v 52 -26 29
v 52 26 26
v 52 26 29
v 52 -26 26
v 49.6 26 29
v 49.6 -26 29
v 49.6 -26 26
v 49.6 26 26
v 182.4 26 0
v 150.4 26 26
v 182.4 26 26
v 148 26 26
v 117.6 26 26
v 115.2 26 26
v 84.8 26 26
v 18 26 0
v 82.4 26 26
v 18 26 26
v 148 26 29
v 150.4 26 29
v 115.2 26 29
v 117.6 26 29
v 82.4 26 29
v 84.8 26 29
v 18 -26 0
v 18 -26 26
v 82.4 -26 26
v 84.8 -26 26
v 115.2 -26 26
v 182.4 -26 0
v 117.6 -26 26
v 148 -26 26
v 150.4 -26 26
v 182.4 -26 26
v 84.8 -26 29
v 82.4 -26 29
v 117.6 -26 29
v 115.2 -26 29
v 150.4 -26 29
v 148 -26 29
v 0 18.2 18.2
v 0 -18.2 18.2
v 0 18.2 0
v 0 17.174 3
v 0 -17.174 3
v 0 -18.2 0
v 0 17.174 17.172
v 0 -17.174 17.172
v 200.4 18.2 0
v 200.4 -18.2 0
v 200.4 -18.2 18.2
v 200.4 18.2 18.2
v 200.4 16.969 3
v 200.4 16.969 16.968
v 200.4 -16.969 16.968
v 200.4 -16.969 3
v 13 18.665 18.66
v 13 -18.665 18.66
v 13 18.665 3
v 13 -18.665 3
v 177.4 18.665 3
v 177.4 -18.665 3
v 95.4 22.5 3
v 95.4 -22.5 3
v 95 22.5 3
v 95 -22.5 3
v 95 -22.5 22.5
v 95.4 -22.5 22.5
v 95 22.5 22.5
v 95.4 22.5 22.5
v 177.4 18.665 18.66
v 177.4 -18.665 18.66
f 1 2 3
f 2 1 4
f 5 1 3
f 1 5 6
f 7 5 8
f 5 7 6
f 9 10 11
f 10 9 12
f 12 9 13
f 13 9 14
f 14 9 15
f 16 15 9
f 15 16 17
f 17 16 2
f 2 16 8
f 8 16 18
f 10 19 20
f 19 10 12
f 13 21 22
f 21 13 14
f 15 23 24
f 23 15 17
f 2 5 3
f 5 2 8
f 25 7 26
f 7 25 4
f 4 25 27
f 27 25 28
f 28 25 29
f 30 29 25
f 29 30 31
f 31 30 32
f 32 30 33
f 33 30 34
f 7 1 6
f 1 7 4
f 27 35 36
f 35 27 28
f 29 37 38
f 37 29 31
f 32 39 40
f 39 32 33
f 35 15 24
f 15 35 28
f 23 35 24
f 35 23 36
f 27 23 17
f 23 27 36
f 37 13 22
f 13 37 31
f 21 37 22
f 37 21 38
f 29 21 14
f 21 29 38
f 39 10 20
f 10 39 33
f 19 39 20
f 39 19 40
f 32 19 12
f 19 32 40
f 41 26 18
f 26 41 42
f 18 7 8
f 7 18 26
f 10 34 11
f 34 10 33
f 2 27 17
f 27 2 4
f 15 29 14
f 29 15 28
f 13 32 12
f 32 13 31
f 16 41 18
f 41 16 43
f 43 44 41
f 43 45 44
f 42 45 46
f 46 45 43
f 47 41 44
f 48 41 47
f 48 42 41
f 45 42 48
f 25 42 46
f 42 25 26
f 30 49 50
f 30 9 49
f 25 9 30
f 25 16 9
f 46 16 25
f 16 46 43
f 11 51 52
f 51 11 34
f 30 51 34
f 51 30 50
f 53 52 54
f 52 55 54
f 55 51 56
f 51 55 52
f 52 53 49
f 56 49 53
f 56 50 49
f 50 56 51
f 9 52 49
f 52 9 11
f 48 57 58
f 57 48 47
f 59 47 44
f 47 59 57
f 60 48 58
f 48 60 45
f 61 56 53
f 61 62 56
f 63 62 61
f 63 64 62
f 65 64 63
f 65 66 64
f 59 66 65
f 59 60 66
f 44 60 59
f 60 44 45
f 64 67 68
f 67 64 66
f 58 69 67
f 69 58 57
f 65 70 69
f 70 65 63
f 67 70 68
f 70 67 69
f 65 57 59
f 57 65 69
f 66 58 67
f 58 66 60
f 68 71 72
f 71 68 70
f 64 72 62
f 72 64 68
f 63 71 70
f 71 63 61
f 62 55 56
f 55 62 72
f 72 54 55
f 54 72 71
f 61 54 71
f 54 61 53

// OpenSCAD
$fn = 32;

// ----------------------------------------------------------------------
// Faired channel: 200 x 52 x 26 mm, 3.5 mm walls, faired ends
// ----------------------------------------------------------------------

// --- parameters (mm) ---
length = 200;             // channel length
width = 52;               // channel width at mid length
height = 26;              // channel height at mid length
wall = 3.5;               // side wall thickness
floor_t = 3;              // floor thickness
end_w = 36.4;             // faired end width
end_h = 18.2;             // faired end height
ribs = 4;                 // stiffening ribs on the top
rib_t = 2.4;              // rib thickness
rib_h = 3;                // rib height

difference() {
  union() {
    hull() {
      translate([0, -18.2, 0]) cube([0.4, 36.4, 18.2]);
      translate([18, -26, 0]) cube([0.4, 52, 26]);
    }
    hull() {
      translate([18, -26, 0]) cube([0.4, 52, 26]);
      translate([100, -26, 0]) cube([0.4, 52, 26]);
    }
    hull() {
      translate([100, -26, 0]) cube([0.4, 52, 26]);
      translate([182, -26, 0]) cube([0.4, 52, 26]);
    }
    hull() {
      translate([182, -26, 0]) cube([0.4, 52, 26]);
      translate([200, -18.2, 0]) cube([0.4, 36.4, 18.2]);
    }
    /* stiffening ribs across the flat top, sunk 0.8 mm into it */
    for (i = [1 : ribs]) {
      translate([18 + i * (length - 2 * 18) / (ribs + 1) - rib_t / 2, -width / 2, height - 0.8]) cube([rib_t, width, rib_h + 0.8]);
    }
  }
  /* cavity, 5 mm proud of both ends so the ports are cut clean */
  hull() {
    translate([-5, -16.6, 3]) cube([0.4, 33.2, 13.6]);
    translate([13, -18.665, 3]) cube([0.4, 37.33, 15.66]);
  }
  hull() {
    translate([13, -18.665, 3]) cube([0.4, 37.33, 15.66]);
    translate([95, -22.5, 3]) cube([0.4, 45, 19.5]);
  }
  hull() {
    translate([95, -22.5, 3]) cube([0.4, 45, 19.5]);
    translate([177, -18.665, 3]) cube([0.4, 37.33, 15.66]);
  }
  hull() {
    translate([177, -18.665, 3]) cube([0.4, 37.33, 15.66]);
    translate([205, -16.6, 3]) cube([0.4, 33.2, 13.6]);
  }
}
